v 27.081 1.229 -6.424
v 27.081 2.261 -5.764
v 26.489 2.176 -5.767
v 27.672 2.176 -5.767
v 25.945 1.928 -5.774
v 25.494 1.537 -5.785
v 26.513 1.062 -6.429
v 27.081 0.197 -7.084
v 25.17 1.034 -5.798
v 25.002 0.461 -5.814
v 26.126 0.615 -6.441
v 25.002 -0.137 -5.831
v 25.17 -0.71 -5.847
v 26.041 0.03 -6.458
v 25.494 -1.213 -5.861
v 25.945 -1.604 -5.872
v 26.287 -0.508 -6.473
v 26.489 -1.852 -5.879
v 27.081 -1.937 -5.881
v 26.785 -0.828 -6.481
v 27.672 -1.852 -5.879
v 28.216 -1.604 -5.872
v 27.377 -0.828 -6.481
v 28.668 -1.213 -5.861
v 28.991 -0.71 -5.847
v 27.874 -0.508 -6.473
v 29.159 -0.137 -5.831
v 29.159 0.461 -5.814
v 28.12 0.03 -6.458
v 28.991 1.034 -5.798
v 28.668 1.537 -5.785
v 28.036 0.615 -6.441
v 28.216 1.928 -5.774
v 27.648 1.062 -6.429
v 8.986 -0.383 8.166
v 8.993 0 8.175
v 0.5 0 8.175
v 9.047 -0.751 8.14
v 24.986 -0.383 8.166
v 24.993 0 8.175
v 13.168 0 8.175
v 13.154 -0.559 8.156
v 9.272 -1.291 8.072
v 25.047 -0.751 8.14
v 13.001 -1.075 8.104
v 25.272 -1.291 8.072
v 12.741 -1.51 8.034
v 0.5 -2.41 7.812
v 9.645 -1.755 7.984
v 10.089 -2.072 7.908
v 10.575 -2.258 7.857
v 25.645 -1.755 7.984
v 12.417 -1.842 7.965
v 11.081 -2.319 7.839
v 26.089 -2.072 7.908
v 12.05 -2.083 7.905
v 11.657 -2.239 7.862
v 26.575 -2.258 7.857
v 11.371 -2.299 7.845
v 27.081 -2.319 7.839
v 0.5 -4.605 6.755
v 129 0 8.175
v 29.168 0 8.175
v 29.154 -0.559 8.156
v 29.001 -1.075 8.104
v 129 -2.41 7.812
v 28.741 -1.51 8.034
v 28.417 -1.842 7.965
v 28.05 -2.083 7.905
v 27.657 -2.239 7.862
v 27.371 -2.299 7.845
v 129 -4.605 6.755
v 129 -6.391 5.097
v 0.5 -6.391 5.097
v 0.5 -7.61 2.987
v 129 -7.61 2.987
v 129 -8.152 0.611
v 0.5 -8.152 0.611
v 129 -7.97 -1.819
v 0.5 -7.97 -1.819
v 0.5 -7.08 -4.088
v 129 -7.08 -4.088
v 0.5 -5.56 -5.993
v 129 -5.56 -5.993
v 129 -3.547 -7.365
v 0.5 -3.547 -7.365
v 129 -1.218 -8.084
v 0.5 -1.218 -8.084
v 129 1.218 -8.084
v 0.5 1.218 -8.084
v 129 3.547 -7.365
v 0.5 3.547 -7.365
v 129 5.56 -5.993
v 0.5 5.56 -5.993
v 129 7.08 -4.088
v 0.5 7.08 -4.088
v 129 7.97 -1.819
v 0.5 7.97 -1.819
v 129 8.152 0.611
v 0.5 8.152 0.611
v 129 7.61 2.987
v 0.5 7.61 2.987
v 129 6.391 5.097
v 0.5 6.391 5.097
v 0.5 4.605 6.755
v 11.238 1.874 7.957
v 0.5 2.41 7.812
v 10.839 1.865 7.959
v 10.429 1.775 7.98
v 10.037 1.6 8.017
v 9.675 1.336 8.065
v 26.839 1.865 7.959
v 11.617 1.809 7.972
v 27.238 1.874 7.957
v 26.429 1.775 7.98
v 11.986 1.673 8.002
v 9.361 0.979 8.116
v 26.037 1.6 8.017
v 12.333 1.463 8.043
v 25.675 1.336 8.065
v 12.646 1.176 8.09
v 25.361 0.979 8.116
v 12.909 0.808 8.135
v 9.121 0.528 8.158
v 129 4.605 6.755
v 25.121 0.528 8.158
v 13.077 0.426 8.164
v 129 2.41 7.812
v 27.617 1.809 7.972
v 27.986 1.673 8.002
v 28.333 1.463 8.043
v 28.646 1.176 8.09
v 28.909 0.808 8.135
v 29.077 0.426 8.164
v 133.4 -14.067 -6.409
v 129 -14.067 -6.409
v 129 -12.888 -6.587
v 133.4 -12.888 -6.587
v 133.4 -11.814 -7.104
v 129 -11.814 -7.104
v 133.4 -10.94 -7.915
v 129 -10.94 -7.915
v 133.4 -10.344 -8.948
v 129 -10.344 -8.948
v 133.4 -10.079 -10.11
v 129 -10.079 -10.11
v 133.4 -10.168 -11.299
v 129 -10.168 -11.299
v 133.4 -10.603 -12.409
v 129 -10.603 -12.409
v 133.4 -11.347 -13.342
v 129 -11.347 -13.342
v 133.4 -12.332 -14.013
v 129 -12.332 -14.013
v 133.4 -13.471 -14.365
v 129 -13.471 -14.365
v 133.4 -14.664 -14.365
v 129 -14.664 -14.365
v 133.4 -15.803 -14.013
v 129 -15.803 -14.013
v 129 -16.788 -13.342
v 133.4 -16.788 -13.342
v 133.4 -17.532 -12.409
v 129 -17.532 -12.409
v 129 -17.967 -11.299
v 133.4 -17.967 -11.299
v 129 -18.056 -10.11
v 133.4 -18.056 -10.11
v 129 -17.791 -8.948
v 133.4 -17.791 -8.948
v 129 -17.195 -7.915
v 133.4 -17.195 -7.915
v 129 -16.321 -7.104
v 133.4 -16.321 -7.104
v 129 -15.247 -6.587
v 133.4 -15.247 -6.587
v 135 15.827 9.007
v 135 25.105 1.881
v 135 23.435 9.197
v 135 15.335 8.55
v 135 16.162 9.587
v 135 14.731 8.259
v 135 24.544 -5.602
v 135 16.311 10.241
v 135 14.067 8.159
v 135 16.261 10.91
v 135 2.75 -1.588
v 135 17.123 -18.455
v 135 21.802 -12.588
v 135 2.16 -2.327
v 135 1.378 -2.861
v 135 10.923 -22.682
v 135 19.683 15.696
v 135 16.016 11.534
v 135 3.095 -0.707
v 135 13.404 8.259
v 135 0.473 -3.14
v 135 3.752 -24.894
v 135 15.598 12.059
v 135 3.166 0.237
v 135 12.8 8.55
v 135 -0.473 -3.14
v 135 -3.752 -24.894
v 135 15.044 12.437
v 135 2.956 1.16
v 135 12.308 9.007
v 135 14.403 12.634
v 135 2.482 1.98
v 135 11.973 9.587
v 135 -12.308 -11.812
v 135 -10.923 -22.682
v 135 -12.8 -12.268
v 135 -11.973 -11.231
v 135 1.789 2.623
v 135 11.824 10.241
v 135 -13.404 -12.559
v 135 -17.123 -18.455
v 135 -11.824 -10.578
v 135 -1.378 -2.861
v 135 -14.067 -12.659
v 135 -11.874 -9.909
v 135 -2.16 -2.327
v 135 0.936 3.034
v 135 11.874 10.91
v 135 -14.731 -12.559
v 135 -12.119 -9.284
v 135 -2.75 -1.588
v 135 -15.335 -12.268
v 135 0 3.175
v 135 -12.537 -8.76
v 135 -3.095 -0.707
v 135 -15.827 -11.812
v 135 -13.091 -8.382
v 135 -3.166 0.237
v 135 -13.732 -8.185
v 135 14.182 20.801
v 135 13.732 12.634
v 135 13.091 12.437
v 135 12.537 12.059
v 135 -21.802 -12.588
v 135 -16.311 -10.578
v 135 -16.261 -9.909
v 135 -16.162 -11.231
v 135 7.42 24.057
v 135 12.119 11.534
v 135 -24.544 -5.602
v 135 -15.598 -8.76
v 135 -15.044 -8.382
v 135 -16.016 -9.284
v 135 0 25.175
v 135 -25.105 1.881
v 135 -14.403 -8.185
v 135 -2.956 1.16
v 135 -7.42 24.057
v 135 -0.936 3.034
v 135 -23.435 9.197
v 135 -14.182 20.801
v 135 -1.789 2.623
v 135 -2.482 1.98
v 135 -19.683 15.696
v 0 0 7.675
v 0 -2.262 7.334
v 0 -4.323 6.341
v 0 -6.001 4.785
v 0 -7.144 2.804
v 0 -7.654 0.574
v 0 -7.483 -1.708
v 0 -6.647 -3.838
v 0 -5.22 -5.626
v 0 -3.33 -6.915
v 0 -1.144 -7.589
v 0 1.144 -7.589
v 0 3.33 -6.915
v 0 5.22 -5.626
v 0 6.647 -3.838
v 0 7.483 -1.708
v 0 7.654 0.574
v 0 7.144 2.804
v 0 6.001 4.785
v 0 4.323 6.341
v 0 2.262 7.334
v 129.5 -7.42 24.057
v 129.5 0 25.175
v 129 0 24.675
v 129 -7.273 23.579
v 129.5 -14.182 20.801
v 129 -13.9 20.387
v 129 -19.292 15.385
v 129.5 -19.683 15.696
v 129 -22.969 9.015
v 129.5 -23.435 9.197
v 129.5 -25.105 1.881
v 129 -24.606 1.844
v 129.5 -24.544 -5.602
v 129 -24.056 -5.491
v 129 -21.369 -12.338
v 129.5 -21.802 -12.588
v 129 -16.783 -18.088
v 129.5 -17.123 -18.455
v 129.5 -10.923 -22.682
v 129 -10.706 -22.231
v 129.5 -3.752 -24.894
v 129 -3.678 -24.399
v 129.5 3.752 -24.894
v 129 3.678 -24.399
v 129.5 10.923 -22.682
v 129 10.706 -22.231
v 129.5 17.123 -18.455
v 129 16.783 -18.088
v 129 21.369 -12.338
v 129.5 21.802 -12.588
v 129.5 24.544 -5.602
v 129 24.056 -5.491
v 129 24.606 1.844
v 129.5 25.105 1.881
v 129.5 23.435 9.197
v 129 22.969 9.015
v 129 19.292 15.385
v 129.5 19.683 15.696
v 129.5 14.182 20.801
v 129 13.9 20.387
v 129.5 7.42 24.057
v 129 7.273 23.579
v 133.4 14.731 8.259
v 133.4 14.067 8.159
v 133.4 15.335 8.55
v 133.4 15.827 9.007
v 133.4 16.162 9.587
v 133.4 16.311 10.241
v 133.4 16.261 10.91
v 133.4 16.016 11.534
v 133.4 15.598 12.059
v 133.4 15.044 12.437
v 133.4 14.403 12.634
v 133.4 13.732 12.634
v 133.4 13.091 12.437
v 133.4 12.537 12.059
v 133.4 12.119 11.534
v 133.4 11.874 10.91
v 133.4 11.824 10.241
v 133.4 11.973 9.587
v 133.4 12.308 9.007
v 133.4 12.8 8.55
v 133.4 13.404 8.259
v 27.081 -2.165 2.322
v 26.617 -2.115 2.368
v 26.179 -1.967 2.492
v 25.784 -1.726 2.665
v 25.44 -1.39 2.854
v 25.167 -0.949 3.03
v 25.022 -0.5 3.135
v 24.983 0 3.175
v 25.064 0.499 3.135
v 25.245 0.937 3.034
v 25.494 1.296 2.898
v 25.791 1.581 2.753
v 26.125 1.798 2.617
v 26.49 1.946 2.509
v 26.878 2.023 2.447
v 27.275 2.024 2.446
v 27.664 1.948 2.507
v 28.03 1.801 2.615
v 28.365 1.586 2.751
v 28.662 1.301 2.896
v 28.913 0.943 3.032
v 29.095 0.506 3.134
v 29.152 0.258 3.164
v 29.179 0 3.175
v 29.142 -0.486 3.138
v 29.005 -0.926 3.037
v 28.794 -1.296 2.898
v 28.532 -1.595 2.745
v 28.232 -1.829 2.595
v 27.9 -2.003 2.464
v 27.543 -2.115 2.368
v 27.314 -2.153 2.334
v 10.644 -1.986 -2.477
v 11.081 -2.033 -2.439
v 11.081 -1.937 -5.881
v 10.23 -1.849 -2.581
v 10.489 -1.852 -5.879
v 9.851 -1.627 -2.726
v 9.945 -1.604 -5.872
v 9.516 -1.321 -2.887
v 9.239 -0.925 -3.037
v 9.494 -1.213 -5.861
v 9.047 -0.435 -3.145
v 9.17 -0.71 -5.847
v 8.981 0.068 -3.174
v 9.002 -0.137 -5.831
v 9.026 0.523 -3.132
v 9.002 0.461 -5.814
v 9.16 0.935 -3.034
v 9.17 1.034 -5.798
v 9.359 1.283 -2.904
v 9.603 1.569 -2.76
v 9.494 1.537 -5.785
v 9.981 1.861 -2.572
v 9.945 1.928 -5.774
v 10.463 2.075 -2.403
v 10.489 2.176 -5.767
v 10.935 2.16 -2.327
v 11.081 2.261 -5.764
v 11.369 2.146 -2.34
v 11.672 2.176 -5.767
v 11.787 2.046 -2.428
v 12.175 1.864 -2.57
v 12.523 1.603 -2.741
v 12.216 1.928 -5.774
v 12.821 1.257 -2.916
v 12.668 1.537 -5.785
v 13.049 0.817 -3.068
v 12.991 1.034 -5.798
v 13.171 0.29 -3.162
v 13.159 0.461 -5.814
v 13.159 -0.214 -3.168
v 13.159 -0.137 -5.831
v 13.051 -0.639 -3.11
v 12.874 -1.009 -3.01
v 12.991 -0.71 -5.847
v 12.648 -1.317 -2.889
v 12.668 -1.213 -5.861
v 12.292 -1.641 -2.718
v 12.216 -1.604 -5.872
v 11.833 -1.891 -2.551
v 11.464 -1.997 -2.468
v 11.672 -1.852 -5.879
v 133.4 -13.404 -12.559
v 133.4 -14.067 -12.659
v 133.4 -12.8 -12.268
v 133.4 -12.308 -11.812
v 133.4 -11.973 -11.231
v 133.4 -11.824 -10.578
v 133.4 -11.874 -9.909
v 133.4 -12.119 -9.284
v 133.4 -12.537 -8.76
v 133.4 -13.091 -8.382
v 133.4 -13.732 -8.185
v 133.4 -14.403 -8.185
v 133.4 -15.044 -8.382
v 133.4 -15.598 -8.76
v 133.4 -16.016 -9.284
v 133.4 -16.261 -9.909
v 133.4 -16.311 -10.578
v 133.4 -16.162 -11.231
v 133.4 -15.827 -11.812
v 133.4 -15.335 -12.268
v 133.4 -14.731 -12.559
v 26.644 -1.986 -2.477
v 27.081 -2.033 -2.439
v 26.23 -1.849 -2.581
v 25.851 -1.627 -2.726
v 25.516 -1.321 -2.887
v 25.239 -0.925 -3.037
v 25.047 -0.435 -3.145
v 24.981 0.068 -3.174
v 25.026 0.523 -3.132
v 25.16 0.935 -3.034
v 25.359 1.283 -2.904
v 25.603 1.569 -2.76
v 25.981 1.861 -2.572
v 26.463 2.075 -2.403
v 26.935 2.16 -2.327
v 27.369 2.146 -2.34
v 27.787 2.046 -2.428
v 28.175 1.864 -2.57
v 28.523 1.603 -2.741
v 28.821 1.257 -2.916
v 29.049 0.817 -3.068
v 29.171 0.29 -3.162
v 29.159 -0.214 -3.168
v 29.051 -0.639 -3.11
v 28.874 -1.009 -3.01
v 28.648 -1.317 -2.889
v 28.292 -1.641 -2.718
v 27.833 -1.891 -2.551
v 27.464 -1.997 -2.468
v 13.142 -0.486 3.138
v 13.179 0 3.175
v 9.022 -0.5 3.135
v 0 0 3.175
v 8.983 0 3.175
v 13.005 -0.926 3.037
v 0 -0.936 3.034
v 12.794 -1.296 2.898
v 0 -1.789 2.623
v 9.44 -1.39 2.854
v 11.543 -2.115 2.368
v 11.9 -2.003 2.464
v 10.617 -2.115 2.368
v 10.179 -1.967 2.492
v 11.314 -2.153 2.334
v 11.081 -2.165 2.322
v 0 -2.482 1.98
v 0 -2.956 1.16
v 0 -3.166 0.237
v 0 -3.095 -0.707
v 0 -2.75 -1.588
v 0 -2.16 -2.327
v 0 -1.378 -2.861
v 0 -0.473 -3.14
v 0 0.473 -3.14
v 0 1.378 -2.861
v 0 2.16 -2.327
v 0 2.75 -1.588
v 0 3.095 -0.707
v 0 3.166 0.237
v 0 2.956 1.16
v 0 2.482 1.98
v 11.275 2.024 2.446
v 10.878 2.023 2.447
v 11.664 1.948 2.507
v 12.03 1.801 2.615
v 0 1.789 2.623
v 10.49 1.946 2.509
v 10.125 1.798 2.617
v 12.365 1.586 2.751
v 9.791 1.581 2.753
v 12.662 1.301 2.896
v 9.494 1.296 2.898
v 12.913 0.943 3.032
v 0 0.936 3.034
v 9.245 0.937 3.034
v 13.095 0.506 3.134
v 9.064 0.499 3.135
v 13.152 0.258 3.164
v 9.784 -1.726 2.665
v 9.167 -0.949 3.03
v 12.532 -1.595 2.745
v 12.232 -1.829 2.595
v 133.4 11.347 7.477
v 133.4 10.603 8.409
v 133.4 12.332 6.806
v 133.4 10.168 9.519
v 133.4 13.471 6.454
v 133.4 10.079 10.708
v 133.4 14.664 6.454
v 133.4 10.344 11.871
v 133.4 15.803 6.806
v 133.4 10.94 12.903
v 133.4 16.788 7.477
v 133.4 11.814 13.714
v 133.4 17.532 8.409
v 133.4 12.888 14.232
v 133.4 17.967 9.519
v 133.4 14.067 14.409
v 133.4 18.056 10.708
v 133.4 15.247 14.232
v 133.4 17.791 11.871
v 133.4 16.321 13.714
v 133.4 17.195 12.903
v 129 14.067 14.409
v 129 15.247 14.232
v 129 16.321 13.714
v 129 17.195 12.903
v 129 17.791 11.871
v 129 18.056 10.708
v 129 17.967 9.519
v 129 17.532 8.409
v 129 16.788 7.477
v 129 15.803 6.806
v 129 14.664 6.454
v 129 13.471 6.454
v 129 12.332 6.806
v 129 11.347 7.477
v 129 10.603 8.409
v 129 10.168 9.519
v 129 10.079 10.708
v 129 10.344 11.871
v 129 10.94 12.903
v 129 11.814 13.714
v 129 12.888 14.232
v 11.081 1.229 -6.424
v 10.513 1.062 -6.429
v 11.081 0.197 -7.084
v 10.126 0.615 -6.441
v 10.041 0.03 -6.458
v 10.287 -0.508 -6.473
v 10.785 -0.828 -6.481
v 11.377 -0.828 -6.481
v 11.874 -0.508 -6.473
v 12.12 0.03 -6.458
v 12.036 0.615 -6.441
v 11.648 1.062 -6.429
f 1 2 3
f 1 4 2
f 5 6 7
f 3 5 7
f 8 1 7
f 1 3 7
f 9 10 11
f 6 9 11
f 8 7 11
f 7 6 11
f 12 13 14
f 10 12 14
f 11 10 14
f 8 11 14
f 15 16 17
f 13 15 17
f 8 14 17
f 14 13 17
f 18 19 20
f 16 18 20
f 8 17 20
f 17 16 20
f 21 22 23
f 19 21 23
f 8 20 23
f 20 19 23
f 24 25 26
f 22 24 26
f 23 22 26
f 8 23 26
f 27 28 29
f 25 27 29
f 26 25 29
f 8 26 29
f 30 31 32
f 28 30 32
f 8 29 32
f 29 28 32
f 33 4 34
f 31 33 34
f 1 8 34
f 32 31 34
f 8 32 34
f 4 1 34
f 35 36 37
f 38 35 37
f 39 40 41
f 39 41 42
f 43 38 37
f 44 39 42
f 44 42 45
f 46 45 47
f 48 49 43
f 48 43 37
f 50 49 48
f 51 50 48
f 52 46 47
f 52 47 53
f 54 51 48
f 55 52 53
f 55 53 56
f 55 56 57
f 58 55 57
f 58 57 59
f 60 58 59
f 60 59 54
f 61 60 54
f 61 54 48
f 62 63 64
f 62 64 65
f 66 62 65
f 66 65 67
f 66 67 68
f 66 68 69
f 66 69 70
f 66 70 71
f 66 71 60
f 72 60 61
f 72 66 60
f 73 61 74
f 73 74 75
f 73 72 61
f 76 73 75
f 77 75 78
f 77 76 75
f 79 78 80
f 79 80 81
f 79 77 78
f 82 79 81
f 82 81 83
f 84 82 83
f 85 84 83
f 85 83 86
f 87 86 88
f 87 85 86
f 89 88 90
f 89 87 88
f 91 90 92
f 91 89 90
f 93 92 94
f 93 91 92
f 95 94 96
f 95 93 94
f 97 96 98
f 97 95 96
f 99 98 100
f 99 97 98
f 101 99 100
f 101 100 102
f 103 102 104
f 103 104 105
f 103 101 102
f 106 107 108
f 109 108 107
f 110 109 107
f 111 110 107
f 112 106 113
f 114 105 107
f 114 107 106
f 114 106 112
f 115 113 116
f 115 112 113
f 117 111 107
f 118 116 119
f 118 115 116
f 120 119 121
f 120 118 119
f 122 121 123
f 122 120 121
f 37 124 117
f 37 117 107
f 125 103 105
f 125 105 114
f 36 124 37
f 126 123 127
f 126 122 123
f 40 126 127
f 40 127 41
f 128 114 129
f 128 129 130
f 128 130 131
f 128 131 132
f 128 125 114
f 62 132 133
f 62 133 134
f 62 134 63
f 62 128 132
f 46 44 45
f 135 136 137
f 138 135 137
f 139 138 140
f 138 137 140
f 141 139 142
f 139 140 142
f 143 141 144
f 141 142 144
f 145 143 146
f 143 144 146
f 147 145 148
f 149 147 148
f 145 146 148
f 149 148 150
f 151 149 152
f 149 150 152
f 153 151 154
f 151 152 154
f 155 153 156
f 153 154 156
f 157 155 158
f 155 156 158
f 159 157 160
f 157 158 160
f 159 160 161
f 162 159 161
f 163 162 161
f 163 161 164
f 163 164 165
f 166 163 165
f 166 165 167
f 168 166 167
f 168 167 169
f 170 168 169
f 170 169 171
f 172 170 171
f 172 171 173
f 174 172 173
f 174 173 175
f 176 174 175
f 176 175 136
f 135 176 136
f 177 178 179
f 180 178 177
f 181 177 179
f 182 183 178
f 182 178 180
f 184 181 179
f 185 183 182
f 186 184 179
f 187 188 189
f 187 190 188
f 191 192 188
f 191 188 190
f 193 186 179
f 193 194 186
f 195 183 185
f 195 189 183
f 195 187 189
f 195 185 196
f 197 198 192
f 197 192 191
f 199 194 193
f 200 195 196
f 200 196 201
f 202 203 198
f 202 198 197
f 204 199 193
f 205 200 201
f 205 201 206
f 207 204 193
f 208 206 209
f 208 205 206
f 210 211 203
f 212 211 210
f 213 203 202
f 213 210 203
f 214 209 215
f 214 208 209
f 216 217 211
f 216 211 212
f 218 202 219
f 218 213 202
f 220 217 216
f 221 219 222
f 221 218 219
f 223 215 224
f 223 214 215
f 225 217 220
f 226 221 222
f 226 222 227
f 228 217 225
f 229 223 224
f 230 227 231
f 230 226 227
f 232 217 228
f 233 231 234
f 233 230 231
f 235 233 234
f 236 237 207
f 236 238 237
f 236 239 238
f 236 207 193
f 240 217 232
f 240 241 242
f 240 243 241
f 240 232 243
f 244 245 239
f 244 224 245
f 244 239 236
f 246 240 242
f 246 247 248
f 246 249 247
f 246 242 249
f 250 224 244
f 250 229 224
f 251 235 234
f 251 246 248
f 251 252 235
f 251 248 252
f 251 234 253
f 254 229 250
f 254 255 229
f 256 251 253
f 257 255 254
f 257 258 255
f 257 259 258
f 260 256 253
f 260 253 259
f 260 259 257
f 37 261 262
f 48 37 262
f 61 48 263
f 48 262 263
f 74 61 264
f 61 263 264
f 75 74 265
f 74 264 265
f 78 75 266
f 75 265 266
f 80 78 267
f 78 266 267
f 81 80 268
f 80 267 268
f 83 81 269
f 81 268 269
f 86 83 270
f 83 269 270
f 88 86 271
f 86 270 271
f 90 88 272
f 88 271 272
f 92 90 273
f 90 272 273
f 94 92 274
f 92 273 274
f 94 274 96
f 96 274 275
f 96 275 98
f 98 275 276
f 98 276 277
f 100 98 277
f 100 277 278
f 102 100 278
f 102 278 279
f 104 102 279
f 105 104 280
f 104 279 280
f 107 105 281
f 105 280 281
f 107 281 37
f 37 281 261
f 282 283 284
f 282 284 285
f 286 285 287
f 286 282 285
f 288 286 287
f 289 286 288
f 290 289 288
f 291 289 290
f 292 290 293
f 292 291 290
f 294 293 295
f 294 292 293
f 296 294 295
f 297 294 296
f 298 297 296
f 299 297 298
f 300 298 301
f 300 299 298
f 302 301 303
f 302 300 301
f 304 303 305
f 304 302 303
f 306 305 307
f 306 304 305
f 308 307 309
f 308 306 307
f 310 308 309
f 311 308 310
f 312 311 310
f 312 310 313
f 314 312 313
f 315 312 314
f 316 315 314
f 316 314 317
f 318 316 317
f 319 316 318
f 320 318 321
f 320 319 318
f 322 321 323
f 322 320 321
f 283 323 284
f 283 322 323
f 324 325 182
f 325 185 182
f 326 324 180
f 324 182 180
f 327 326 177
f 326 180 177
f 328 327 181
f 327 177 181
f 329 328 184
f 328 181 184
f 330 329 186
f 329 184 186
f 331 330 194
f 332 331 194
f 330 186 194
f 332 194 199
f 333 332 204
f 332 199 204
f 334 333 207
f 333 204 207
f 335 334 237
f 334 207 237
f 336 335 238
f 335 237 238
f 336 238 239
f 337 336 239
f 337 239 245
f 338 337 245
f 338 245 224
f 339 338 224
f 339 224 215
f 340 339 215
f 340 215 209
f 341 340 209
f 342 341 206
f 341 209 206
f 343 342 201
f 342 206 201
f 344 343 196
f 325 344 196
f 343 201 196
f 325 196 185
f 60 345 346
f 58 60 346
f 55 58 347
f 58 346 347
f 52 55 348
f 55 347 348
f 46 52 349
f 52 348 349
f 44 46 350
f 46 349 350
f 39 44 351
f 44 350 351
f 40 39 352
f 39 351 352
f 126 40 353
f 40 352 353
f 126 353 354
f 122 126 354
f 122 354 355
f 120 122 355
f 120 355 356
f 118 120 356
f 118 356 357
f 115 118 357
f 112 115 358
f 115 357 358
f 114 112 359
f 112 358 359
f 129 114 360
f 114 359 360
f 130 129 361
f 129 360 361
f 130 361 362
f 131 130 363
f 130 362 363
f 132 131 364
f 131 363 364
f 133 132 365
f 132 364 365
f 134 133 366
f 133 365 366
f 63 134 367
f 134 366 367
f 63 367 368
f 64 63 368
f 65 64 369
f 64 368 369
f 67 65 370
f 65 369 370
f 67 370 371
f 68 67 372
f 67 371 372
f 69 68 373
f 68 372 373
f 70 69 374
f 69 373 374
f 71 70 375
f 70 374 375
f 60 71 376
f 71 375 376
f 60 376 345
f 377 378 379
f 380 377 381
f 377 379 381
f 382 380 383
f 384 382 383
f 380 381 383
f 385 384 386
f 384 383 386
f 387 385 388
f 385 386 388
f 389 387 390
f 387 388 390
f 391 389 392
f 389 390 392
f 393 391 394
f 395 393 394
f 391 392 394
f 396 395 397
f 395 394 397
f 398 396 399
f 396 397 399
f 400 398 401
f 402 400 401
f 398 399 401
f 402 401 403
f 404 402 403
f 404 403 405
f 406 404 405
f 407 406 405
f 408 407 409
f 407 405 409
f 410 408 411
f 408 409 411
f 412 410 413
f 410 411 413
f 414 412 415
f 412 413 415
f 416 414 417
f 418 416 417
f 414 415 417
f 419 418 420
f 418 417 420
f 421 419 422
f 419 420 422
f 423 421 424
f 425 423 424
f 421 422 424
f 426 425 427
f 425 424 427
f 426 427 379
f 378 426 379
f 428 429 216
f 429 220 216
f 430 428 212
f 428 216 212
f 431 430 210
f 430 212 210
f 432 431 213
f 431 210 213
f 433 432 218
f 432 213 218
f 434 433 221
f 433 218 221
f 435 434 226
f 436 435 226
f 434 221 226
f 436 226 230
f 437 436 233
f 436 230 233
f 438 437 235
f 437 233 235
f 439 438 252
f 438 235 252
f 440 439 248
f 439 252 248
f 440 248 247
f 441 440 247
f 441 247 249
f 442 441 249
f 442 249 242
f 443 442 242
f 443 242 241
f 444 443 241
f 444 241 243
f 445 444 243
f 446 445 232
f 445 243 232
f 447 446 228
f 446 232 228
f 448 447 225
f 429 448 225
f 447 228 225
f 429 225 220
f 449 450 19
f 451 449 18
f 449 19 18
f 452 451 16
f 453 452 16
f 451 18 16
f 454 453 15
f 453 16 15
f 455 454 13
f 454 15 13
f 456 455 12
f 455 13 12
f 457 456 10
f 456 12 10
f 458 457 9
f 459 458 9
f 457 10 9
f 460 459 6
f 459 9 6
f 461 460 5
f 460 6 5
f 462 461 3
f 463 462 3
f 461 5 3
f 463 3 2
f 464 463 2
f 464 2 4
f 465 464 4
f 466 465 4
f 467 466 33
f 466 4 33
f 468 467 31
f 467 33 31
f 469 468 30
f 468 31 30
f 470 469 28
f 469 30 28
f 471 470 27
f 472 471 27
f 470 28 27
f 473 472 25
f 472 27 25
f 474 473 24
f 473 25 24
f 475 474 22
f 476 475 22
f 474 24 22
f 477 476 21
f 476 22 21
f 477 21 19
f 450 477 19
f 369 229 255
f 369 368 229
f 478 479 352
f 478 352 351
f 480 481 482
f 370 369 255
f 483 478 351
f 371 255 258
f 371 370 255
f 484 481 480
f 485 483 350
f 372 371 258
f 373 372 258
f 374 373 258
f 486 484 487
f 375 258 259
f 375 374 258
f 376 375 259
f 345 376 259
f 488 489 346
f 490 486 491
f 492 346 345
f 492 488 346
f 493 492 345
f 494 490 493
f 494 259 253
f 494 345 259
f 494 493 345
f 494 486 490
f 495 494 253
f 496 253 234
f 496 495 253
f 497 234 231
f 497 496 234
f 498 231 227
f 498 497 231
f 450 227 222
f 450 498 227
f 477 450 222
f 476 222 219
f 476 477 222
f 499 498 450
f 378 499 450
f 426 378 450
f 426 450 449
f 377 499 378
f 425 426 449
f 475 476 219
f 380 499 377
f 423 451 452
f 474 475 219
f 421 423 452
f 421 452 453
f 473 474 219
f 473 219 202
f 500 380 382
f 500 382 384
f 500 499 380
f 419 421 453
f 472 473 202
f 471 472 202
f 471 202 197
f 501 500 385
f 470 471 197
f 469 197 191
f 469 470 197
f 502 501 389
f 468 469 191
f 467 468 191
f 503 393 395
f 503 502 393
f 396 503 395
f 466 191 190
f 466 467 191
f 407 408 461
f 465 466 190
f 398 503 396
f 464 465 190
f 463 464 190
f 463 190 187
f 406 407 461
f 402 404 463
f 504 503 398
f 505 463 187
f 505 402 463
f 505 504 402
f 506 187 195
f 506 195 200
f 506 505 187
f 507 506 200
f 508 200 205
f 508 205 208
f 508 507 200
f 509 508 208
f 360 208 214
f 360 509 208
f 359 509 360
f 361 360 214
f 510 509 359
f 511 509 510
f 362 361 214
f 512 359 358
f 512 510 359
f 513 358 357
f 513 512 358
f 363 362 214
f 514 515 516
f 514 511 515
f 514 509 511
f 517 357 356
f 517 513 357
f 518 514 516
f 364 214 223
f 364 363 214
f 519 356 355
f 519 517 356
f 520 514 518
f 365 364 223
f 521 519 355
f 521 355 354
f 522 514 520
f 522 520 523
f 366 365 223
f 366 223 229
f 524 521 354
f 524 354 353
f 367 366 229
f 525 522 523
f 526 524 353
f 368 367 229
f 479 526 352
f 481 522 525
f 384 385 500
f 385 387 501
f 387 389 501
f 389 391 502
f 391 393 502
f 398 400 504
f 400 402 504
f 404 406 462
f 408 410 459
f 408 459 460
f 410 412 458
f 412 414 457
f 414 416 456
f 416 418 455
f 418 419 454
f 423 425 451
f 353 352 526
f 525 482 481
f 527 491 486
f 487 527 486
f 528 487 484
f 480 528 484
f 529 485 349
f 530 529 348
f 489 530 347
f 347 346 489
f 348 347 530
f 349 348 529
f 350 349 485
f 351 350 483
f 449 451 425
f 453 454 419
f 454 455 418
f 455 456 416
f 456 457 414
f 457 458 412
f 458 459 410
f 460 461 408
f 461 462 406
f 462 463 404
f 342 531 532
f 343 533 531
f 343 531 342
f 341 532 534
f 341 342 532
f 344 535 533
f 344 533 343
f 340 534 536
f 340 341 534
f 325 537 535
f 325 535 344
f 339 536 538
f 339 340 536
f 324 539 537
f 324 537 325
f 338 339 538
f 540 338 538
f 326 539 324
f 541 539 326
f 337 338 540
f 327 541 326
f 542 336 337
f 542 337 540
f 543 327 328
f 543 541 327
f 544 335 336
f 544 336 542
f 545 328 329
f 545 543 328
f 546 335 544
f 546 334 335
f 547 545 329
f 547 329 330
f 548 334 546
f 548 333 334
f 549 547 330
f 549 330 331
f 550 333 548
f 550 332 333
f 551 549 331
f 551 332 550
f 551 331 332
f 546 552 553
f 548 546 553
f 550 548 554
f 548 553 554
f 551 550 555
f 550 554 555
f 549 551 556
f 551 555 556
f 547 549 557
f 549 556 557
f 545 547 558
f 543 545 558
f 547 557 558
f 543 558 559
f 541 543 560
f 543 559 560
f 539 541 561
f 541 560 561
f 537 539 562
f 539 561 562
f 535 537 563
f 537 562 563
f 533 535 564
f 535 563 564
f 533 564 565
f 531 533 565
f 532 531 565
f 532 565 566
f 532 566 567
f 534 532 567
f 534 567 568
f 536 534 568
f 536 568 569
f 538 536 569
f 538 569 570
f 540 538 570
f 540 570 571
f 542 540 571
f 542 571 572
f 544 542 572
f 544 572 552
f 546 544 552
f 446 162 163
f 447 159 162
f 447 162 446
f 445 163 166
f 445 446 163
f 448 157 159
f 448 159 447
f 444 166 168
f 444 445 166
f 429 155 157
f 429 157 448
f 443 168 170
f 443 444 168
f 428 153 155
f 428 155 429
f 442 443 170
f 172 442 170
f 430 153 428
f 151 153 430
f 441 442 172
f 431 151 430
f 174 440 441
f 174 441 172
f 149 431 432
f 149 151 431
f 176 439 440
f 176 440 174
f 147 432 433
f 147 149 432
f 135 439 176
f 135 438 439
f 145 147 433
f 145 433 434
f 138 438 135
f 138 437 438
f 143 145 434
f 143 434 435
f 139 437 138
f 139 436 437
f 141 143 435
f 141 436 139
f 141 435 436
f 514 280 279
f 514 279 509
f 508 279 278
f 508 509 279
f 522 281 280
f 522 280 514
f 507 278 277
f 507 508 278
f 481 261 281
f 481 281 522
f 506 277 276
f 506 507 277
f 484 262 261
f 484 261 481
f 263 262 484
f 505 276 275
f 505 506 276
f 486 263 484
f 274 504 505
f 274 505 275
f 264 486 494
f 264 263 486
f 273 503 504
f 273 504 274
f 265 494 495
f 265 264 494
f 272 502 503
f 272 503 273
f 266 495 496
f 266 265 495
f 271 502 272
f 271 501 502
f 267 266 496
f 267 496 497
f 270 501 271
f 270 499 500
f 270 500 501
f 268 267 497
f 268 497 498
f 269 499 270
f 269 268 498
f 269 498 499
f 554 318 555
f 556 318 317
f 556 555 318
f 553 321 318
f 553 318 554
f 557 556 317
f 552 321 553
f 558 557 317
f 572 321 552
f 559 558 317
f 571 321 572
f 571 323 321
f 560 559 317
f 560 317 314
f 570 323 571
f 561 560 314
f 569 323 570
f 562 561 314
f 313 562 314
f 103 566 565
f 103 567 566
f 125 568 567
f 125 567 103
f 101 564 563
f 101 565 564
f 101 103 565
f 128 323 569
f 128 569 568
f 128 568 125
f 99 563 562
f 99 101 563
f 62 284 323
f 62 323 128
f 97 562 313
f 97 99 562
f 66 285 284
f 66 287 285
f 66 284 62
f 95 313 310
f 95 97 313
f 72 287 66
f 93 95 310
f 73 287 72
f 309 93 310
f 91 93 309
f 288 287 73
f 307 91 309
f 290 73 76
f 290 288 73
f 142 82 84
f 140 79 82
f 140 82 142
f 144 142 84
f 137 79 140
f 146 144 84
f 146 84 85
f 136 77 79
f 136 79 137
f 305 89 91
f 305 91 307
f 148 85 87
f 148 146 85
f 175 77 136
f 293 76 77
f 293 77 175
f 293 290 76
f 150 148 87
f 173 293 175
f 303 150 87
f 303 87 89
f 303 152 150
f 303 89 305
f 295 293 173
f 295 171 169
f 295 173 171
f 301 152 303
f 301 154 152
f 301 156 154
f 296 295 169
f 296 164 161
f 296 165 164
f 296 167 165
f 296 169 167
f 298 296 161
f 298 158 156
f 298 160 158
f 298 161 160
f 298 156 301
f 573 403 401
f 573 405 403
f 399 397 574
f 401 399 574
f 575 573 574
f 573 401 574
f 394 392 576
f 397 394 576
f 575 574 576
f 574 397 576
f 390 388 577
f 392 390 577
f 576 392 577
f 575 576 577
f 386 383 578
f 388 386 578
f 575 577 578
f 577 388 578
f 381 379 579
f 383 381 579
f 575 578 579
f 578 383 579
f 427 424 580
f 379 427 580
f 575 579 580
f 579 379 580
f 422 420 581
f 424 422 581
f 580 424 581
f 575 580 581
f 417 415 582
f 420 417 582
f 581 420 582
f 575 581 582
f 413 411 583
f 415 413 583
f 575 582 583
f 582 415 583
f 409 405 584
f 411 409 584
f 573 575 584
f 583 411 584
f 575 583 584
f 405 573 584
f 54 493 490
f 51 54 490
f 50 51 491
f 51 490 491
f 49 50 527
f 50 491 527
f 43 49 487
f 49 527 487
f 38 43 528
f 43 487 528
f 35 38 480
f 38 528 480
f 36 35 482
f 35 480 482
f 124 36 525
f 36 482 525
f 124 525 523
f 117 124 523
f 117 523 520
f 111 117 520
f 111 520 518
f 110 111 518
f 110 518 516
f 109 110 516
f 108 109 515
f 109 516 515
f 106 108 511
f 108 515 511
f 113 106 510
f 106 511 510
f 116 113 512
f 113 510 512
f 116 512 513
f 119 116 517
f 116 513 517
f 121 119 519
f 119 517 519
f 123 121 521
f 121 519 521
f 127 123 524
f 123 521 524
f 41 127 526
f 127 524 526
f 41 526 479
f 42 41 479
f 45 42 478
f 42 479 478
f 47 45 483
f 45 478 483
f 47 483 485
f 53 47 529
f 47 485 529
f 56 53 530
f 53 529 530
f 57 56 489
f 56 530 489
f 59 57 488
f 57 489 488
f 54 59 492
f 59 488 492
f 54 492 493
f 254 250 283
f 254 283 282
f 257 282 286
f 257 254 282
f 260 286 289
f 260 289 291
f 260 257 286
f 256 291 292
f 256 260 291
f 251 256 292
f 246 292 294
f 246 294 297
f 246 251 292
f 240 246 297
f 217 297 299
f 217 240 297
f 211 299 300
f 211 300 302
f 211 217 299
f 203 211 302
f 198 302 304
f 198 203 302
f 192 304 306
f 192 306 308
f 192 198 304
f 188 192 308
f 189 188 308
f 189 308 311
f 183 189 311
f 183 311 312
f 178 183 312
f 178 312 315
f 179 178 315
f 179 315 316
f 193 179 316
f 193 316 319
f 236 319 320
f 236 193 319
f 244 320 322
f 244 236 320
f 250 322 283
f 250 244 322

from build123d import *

# Parameters (mm, degrees)
CHANFREIN1_SIZE                                    = 0.5
CHAMBRAGE_POUR_VIS_T_TE_HEXAGONALE_M41_D           = 4.5
CHAMBRAGE_POUR_VIS_T_TE_HEXAGONALE_M41_CBORE_D     = 8
CHAMBRAGE_POUR_VIS_T_TE_HEXAGONALE_M41_CBORE_DEPTH = 4.4
TROU_TARAUD_M51_D                                  = 4.2
TROU_TARAUD_M51_DEPTH                              = 14
TROU_TARAUD_M51_TIP                                = 1.2618073
TROU_TARAUD_M51_ON_FACE_2_D                        = 4.2
TROU_TARAUD_M51_ON_FACE_2_DEPTH                    = 14
TROU_TARAUD_M51_ON_FACE_2_TIP                      = 1.2618073


with BuildPart() as part:
    # Esquisse1 → Révolution1 (revolve)
    with BuildSketch(Plane.XY, mode=Mode.PRIVATE) as r_volution1_sk:
        Polygon((0, 8.175), (129, 8.175), (129, 25.175), (135, 25.175), (135, 3.175), (0, 3.175), align=None)
    revolve(r_volution1_sk.sketch.rotate(Axis((0, 0, 0), (1, 0, 0)), 90), axis=Axis((0, 0, 0), (1, 0, 0)))

    # Chanfrein1
    chanfrein1_edges = [part.edges().sort_by_distance(p)[0] for p in [
        (129, 0, -25.175),
        (0, 0, -8.175),
    ]]
    chamfer(chanfrein1_edges, length=CHANFREIN1_SIZE)

    # Chambrage pour vis à tête hexagonale M41 (through all)
    with Locations(Plane.ZY.offset(-129)):
        with Locations((-10.409398768, -14.067495061), (10.409398768, 14.067495061)):
            CounterBoreHole(CHAMBRAGE_POUR_VIS_T_TE_HEXAGONALE_M41_D / 2, CHAMBRAGE_POUR_VIS_T_TE_HEXAGONALE_M41_CBORE_D / 2, CHAMBRAGE_POUR_VIS_T_TE_HEXAGONALE_M41_CBORE_DEPTH)

    # Trou taraudé M51
    with Locations(Plane(origin=(11.080716358, -0.227251989, 8.171840768), x_dir=(0, 0.999613549573, 0.027798408415), z_dir=(0, -0.027798408415, 0.999613549573))):
        with Locations((0, 0)):
            Hole(TROU_TARAUD_M51_D / 2, depth=TROU_TARAUD_M51_DEPTH)
            with Locations((0, 0, -(TROU_TARAUD_M51_DEPTH + TROU_TARAUD_M51_TIP / 2))):  # 118° drill point
                Cone(0, TROU_TARAUD_M51_D / 2, TROU_TARAUD_M51_TIP, mode=Mode.SUBTRACT)

    # Trou taraudé M51 on face 2
    with Locations(Plane(origin=(27.080716358, -0.227251989, 8.171840768), x_dir=(0, 0.99961356127, 0.027797987799), z_dir=(0, -0.027797987799, 0.99961356127))):
        with Locations((0, 0)):
            Hole(TROU_TARAUD_M51_ON_FACE_2_D / 2, depth=TROU_TARAUD_M51_ON_FACE_2_DEPTH)
            with Locations((0, 0, -(TROU_TARAUD_M51_ON_FACE_2_DEPTH + TROU_TARAUD_M51_ON_FACE_2_TIP / 2))):  # 118° drill point
                Cone(0, TROU_TARAUD_M51_ON_FACE_2_D / 2, TROU_TARAUD_M51_ON_FACE_2_TIP, mode=Mode.SUBTRACT)


solid = part.part
